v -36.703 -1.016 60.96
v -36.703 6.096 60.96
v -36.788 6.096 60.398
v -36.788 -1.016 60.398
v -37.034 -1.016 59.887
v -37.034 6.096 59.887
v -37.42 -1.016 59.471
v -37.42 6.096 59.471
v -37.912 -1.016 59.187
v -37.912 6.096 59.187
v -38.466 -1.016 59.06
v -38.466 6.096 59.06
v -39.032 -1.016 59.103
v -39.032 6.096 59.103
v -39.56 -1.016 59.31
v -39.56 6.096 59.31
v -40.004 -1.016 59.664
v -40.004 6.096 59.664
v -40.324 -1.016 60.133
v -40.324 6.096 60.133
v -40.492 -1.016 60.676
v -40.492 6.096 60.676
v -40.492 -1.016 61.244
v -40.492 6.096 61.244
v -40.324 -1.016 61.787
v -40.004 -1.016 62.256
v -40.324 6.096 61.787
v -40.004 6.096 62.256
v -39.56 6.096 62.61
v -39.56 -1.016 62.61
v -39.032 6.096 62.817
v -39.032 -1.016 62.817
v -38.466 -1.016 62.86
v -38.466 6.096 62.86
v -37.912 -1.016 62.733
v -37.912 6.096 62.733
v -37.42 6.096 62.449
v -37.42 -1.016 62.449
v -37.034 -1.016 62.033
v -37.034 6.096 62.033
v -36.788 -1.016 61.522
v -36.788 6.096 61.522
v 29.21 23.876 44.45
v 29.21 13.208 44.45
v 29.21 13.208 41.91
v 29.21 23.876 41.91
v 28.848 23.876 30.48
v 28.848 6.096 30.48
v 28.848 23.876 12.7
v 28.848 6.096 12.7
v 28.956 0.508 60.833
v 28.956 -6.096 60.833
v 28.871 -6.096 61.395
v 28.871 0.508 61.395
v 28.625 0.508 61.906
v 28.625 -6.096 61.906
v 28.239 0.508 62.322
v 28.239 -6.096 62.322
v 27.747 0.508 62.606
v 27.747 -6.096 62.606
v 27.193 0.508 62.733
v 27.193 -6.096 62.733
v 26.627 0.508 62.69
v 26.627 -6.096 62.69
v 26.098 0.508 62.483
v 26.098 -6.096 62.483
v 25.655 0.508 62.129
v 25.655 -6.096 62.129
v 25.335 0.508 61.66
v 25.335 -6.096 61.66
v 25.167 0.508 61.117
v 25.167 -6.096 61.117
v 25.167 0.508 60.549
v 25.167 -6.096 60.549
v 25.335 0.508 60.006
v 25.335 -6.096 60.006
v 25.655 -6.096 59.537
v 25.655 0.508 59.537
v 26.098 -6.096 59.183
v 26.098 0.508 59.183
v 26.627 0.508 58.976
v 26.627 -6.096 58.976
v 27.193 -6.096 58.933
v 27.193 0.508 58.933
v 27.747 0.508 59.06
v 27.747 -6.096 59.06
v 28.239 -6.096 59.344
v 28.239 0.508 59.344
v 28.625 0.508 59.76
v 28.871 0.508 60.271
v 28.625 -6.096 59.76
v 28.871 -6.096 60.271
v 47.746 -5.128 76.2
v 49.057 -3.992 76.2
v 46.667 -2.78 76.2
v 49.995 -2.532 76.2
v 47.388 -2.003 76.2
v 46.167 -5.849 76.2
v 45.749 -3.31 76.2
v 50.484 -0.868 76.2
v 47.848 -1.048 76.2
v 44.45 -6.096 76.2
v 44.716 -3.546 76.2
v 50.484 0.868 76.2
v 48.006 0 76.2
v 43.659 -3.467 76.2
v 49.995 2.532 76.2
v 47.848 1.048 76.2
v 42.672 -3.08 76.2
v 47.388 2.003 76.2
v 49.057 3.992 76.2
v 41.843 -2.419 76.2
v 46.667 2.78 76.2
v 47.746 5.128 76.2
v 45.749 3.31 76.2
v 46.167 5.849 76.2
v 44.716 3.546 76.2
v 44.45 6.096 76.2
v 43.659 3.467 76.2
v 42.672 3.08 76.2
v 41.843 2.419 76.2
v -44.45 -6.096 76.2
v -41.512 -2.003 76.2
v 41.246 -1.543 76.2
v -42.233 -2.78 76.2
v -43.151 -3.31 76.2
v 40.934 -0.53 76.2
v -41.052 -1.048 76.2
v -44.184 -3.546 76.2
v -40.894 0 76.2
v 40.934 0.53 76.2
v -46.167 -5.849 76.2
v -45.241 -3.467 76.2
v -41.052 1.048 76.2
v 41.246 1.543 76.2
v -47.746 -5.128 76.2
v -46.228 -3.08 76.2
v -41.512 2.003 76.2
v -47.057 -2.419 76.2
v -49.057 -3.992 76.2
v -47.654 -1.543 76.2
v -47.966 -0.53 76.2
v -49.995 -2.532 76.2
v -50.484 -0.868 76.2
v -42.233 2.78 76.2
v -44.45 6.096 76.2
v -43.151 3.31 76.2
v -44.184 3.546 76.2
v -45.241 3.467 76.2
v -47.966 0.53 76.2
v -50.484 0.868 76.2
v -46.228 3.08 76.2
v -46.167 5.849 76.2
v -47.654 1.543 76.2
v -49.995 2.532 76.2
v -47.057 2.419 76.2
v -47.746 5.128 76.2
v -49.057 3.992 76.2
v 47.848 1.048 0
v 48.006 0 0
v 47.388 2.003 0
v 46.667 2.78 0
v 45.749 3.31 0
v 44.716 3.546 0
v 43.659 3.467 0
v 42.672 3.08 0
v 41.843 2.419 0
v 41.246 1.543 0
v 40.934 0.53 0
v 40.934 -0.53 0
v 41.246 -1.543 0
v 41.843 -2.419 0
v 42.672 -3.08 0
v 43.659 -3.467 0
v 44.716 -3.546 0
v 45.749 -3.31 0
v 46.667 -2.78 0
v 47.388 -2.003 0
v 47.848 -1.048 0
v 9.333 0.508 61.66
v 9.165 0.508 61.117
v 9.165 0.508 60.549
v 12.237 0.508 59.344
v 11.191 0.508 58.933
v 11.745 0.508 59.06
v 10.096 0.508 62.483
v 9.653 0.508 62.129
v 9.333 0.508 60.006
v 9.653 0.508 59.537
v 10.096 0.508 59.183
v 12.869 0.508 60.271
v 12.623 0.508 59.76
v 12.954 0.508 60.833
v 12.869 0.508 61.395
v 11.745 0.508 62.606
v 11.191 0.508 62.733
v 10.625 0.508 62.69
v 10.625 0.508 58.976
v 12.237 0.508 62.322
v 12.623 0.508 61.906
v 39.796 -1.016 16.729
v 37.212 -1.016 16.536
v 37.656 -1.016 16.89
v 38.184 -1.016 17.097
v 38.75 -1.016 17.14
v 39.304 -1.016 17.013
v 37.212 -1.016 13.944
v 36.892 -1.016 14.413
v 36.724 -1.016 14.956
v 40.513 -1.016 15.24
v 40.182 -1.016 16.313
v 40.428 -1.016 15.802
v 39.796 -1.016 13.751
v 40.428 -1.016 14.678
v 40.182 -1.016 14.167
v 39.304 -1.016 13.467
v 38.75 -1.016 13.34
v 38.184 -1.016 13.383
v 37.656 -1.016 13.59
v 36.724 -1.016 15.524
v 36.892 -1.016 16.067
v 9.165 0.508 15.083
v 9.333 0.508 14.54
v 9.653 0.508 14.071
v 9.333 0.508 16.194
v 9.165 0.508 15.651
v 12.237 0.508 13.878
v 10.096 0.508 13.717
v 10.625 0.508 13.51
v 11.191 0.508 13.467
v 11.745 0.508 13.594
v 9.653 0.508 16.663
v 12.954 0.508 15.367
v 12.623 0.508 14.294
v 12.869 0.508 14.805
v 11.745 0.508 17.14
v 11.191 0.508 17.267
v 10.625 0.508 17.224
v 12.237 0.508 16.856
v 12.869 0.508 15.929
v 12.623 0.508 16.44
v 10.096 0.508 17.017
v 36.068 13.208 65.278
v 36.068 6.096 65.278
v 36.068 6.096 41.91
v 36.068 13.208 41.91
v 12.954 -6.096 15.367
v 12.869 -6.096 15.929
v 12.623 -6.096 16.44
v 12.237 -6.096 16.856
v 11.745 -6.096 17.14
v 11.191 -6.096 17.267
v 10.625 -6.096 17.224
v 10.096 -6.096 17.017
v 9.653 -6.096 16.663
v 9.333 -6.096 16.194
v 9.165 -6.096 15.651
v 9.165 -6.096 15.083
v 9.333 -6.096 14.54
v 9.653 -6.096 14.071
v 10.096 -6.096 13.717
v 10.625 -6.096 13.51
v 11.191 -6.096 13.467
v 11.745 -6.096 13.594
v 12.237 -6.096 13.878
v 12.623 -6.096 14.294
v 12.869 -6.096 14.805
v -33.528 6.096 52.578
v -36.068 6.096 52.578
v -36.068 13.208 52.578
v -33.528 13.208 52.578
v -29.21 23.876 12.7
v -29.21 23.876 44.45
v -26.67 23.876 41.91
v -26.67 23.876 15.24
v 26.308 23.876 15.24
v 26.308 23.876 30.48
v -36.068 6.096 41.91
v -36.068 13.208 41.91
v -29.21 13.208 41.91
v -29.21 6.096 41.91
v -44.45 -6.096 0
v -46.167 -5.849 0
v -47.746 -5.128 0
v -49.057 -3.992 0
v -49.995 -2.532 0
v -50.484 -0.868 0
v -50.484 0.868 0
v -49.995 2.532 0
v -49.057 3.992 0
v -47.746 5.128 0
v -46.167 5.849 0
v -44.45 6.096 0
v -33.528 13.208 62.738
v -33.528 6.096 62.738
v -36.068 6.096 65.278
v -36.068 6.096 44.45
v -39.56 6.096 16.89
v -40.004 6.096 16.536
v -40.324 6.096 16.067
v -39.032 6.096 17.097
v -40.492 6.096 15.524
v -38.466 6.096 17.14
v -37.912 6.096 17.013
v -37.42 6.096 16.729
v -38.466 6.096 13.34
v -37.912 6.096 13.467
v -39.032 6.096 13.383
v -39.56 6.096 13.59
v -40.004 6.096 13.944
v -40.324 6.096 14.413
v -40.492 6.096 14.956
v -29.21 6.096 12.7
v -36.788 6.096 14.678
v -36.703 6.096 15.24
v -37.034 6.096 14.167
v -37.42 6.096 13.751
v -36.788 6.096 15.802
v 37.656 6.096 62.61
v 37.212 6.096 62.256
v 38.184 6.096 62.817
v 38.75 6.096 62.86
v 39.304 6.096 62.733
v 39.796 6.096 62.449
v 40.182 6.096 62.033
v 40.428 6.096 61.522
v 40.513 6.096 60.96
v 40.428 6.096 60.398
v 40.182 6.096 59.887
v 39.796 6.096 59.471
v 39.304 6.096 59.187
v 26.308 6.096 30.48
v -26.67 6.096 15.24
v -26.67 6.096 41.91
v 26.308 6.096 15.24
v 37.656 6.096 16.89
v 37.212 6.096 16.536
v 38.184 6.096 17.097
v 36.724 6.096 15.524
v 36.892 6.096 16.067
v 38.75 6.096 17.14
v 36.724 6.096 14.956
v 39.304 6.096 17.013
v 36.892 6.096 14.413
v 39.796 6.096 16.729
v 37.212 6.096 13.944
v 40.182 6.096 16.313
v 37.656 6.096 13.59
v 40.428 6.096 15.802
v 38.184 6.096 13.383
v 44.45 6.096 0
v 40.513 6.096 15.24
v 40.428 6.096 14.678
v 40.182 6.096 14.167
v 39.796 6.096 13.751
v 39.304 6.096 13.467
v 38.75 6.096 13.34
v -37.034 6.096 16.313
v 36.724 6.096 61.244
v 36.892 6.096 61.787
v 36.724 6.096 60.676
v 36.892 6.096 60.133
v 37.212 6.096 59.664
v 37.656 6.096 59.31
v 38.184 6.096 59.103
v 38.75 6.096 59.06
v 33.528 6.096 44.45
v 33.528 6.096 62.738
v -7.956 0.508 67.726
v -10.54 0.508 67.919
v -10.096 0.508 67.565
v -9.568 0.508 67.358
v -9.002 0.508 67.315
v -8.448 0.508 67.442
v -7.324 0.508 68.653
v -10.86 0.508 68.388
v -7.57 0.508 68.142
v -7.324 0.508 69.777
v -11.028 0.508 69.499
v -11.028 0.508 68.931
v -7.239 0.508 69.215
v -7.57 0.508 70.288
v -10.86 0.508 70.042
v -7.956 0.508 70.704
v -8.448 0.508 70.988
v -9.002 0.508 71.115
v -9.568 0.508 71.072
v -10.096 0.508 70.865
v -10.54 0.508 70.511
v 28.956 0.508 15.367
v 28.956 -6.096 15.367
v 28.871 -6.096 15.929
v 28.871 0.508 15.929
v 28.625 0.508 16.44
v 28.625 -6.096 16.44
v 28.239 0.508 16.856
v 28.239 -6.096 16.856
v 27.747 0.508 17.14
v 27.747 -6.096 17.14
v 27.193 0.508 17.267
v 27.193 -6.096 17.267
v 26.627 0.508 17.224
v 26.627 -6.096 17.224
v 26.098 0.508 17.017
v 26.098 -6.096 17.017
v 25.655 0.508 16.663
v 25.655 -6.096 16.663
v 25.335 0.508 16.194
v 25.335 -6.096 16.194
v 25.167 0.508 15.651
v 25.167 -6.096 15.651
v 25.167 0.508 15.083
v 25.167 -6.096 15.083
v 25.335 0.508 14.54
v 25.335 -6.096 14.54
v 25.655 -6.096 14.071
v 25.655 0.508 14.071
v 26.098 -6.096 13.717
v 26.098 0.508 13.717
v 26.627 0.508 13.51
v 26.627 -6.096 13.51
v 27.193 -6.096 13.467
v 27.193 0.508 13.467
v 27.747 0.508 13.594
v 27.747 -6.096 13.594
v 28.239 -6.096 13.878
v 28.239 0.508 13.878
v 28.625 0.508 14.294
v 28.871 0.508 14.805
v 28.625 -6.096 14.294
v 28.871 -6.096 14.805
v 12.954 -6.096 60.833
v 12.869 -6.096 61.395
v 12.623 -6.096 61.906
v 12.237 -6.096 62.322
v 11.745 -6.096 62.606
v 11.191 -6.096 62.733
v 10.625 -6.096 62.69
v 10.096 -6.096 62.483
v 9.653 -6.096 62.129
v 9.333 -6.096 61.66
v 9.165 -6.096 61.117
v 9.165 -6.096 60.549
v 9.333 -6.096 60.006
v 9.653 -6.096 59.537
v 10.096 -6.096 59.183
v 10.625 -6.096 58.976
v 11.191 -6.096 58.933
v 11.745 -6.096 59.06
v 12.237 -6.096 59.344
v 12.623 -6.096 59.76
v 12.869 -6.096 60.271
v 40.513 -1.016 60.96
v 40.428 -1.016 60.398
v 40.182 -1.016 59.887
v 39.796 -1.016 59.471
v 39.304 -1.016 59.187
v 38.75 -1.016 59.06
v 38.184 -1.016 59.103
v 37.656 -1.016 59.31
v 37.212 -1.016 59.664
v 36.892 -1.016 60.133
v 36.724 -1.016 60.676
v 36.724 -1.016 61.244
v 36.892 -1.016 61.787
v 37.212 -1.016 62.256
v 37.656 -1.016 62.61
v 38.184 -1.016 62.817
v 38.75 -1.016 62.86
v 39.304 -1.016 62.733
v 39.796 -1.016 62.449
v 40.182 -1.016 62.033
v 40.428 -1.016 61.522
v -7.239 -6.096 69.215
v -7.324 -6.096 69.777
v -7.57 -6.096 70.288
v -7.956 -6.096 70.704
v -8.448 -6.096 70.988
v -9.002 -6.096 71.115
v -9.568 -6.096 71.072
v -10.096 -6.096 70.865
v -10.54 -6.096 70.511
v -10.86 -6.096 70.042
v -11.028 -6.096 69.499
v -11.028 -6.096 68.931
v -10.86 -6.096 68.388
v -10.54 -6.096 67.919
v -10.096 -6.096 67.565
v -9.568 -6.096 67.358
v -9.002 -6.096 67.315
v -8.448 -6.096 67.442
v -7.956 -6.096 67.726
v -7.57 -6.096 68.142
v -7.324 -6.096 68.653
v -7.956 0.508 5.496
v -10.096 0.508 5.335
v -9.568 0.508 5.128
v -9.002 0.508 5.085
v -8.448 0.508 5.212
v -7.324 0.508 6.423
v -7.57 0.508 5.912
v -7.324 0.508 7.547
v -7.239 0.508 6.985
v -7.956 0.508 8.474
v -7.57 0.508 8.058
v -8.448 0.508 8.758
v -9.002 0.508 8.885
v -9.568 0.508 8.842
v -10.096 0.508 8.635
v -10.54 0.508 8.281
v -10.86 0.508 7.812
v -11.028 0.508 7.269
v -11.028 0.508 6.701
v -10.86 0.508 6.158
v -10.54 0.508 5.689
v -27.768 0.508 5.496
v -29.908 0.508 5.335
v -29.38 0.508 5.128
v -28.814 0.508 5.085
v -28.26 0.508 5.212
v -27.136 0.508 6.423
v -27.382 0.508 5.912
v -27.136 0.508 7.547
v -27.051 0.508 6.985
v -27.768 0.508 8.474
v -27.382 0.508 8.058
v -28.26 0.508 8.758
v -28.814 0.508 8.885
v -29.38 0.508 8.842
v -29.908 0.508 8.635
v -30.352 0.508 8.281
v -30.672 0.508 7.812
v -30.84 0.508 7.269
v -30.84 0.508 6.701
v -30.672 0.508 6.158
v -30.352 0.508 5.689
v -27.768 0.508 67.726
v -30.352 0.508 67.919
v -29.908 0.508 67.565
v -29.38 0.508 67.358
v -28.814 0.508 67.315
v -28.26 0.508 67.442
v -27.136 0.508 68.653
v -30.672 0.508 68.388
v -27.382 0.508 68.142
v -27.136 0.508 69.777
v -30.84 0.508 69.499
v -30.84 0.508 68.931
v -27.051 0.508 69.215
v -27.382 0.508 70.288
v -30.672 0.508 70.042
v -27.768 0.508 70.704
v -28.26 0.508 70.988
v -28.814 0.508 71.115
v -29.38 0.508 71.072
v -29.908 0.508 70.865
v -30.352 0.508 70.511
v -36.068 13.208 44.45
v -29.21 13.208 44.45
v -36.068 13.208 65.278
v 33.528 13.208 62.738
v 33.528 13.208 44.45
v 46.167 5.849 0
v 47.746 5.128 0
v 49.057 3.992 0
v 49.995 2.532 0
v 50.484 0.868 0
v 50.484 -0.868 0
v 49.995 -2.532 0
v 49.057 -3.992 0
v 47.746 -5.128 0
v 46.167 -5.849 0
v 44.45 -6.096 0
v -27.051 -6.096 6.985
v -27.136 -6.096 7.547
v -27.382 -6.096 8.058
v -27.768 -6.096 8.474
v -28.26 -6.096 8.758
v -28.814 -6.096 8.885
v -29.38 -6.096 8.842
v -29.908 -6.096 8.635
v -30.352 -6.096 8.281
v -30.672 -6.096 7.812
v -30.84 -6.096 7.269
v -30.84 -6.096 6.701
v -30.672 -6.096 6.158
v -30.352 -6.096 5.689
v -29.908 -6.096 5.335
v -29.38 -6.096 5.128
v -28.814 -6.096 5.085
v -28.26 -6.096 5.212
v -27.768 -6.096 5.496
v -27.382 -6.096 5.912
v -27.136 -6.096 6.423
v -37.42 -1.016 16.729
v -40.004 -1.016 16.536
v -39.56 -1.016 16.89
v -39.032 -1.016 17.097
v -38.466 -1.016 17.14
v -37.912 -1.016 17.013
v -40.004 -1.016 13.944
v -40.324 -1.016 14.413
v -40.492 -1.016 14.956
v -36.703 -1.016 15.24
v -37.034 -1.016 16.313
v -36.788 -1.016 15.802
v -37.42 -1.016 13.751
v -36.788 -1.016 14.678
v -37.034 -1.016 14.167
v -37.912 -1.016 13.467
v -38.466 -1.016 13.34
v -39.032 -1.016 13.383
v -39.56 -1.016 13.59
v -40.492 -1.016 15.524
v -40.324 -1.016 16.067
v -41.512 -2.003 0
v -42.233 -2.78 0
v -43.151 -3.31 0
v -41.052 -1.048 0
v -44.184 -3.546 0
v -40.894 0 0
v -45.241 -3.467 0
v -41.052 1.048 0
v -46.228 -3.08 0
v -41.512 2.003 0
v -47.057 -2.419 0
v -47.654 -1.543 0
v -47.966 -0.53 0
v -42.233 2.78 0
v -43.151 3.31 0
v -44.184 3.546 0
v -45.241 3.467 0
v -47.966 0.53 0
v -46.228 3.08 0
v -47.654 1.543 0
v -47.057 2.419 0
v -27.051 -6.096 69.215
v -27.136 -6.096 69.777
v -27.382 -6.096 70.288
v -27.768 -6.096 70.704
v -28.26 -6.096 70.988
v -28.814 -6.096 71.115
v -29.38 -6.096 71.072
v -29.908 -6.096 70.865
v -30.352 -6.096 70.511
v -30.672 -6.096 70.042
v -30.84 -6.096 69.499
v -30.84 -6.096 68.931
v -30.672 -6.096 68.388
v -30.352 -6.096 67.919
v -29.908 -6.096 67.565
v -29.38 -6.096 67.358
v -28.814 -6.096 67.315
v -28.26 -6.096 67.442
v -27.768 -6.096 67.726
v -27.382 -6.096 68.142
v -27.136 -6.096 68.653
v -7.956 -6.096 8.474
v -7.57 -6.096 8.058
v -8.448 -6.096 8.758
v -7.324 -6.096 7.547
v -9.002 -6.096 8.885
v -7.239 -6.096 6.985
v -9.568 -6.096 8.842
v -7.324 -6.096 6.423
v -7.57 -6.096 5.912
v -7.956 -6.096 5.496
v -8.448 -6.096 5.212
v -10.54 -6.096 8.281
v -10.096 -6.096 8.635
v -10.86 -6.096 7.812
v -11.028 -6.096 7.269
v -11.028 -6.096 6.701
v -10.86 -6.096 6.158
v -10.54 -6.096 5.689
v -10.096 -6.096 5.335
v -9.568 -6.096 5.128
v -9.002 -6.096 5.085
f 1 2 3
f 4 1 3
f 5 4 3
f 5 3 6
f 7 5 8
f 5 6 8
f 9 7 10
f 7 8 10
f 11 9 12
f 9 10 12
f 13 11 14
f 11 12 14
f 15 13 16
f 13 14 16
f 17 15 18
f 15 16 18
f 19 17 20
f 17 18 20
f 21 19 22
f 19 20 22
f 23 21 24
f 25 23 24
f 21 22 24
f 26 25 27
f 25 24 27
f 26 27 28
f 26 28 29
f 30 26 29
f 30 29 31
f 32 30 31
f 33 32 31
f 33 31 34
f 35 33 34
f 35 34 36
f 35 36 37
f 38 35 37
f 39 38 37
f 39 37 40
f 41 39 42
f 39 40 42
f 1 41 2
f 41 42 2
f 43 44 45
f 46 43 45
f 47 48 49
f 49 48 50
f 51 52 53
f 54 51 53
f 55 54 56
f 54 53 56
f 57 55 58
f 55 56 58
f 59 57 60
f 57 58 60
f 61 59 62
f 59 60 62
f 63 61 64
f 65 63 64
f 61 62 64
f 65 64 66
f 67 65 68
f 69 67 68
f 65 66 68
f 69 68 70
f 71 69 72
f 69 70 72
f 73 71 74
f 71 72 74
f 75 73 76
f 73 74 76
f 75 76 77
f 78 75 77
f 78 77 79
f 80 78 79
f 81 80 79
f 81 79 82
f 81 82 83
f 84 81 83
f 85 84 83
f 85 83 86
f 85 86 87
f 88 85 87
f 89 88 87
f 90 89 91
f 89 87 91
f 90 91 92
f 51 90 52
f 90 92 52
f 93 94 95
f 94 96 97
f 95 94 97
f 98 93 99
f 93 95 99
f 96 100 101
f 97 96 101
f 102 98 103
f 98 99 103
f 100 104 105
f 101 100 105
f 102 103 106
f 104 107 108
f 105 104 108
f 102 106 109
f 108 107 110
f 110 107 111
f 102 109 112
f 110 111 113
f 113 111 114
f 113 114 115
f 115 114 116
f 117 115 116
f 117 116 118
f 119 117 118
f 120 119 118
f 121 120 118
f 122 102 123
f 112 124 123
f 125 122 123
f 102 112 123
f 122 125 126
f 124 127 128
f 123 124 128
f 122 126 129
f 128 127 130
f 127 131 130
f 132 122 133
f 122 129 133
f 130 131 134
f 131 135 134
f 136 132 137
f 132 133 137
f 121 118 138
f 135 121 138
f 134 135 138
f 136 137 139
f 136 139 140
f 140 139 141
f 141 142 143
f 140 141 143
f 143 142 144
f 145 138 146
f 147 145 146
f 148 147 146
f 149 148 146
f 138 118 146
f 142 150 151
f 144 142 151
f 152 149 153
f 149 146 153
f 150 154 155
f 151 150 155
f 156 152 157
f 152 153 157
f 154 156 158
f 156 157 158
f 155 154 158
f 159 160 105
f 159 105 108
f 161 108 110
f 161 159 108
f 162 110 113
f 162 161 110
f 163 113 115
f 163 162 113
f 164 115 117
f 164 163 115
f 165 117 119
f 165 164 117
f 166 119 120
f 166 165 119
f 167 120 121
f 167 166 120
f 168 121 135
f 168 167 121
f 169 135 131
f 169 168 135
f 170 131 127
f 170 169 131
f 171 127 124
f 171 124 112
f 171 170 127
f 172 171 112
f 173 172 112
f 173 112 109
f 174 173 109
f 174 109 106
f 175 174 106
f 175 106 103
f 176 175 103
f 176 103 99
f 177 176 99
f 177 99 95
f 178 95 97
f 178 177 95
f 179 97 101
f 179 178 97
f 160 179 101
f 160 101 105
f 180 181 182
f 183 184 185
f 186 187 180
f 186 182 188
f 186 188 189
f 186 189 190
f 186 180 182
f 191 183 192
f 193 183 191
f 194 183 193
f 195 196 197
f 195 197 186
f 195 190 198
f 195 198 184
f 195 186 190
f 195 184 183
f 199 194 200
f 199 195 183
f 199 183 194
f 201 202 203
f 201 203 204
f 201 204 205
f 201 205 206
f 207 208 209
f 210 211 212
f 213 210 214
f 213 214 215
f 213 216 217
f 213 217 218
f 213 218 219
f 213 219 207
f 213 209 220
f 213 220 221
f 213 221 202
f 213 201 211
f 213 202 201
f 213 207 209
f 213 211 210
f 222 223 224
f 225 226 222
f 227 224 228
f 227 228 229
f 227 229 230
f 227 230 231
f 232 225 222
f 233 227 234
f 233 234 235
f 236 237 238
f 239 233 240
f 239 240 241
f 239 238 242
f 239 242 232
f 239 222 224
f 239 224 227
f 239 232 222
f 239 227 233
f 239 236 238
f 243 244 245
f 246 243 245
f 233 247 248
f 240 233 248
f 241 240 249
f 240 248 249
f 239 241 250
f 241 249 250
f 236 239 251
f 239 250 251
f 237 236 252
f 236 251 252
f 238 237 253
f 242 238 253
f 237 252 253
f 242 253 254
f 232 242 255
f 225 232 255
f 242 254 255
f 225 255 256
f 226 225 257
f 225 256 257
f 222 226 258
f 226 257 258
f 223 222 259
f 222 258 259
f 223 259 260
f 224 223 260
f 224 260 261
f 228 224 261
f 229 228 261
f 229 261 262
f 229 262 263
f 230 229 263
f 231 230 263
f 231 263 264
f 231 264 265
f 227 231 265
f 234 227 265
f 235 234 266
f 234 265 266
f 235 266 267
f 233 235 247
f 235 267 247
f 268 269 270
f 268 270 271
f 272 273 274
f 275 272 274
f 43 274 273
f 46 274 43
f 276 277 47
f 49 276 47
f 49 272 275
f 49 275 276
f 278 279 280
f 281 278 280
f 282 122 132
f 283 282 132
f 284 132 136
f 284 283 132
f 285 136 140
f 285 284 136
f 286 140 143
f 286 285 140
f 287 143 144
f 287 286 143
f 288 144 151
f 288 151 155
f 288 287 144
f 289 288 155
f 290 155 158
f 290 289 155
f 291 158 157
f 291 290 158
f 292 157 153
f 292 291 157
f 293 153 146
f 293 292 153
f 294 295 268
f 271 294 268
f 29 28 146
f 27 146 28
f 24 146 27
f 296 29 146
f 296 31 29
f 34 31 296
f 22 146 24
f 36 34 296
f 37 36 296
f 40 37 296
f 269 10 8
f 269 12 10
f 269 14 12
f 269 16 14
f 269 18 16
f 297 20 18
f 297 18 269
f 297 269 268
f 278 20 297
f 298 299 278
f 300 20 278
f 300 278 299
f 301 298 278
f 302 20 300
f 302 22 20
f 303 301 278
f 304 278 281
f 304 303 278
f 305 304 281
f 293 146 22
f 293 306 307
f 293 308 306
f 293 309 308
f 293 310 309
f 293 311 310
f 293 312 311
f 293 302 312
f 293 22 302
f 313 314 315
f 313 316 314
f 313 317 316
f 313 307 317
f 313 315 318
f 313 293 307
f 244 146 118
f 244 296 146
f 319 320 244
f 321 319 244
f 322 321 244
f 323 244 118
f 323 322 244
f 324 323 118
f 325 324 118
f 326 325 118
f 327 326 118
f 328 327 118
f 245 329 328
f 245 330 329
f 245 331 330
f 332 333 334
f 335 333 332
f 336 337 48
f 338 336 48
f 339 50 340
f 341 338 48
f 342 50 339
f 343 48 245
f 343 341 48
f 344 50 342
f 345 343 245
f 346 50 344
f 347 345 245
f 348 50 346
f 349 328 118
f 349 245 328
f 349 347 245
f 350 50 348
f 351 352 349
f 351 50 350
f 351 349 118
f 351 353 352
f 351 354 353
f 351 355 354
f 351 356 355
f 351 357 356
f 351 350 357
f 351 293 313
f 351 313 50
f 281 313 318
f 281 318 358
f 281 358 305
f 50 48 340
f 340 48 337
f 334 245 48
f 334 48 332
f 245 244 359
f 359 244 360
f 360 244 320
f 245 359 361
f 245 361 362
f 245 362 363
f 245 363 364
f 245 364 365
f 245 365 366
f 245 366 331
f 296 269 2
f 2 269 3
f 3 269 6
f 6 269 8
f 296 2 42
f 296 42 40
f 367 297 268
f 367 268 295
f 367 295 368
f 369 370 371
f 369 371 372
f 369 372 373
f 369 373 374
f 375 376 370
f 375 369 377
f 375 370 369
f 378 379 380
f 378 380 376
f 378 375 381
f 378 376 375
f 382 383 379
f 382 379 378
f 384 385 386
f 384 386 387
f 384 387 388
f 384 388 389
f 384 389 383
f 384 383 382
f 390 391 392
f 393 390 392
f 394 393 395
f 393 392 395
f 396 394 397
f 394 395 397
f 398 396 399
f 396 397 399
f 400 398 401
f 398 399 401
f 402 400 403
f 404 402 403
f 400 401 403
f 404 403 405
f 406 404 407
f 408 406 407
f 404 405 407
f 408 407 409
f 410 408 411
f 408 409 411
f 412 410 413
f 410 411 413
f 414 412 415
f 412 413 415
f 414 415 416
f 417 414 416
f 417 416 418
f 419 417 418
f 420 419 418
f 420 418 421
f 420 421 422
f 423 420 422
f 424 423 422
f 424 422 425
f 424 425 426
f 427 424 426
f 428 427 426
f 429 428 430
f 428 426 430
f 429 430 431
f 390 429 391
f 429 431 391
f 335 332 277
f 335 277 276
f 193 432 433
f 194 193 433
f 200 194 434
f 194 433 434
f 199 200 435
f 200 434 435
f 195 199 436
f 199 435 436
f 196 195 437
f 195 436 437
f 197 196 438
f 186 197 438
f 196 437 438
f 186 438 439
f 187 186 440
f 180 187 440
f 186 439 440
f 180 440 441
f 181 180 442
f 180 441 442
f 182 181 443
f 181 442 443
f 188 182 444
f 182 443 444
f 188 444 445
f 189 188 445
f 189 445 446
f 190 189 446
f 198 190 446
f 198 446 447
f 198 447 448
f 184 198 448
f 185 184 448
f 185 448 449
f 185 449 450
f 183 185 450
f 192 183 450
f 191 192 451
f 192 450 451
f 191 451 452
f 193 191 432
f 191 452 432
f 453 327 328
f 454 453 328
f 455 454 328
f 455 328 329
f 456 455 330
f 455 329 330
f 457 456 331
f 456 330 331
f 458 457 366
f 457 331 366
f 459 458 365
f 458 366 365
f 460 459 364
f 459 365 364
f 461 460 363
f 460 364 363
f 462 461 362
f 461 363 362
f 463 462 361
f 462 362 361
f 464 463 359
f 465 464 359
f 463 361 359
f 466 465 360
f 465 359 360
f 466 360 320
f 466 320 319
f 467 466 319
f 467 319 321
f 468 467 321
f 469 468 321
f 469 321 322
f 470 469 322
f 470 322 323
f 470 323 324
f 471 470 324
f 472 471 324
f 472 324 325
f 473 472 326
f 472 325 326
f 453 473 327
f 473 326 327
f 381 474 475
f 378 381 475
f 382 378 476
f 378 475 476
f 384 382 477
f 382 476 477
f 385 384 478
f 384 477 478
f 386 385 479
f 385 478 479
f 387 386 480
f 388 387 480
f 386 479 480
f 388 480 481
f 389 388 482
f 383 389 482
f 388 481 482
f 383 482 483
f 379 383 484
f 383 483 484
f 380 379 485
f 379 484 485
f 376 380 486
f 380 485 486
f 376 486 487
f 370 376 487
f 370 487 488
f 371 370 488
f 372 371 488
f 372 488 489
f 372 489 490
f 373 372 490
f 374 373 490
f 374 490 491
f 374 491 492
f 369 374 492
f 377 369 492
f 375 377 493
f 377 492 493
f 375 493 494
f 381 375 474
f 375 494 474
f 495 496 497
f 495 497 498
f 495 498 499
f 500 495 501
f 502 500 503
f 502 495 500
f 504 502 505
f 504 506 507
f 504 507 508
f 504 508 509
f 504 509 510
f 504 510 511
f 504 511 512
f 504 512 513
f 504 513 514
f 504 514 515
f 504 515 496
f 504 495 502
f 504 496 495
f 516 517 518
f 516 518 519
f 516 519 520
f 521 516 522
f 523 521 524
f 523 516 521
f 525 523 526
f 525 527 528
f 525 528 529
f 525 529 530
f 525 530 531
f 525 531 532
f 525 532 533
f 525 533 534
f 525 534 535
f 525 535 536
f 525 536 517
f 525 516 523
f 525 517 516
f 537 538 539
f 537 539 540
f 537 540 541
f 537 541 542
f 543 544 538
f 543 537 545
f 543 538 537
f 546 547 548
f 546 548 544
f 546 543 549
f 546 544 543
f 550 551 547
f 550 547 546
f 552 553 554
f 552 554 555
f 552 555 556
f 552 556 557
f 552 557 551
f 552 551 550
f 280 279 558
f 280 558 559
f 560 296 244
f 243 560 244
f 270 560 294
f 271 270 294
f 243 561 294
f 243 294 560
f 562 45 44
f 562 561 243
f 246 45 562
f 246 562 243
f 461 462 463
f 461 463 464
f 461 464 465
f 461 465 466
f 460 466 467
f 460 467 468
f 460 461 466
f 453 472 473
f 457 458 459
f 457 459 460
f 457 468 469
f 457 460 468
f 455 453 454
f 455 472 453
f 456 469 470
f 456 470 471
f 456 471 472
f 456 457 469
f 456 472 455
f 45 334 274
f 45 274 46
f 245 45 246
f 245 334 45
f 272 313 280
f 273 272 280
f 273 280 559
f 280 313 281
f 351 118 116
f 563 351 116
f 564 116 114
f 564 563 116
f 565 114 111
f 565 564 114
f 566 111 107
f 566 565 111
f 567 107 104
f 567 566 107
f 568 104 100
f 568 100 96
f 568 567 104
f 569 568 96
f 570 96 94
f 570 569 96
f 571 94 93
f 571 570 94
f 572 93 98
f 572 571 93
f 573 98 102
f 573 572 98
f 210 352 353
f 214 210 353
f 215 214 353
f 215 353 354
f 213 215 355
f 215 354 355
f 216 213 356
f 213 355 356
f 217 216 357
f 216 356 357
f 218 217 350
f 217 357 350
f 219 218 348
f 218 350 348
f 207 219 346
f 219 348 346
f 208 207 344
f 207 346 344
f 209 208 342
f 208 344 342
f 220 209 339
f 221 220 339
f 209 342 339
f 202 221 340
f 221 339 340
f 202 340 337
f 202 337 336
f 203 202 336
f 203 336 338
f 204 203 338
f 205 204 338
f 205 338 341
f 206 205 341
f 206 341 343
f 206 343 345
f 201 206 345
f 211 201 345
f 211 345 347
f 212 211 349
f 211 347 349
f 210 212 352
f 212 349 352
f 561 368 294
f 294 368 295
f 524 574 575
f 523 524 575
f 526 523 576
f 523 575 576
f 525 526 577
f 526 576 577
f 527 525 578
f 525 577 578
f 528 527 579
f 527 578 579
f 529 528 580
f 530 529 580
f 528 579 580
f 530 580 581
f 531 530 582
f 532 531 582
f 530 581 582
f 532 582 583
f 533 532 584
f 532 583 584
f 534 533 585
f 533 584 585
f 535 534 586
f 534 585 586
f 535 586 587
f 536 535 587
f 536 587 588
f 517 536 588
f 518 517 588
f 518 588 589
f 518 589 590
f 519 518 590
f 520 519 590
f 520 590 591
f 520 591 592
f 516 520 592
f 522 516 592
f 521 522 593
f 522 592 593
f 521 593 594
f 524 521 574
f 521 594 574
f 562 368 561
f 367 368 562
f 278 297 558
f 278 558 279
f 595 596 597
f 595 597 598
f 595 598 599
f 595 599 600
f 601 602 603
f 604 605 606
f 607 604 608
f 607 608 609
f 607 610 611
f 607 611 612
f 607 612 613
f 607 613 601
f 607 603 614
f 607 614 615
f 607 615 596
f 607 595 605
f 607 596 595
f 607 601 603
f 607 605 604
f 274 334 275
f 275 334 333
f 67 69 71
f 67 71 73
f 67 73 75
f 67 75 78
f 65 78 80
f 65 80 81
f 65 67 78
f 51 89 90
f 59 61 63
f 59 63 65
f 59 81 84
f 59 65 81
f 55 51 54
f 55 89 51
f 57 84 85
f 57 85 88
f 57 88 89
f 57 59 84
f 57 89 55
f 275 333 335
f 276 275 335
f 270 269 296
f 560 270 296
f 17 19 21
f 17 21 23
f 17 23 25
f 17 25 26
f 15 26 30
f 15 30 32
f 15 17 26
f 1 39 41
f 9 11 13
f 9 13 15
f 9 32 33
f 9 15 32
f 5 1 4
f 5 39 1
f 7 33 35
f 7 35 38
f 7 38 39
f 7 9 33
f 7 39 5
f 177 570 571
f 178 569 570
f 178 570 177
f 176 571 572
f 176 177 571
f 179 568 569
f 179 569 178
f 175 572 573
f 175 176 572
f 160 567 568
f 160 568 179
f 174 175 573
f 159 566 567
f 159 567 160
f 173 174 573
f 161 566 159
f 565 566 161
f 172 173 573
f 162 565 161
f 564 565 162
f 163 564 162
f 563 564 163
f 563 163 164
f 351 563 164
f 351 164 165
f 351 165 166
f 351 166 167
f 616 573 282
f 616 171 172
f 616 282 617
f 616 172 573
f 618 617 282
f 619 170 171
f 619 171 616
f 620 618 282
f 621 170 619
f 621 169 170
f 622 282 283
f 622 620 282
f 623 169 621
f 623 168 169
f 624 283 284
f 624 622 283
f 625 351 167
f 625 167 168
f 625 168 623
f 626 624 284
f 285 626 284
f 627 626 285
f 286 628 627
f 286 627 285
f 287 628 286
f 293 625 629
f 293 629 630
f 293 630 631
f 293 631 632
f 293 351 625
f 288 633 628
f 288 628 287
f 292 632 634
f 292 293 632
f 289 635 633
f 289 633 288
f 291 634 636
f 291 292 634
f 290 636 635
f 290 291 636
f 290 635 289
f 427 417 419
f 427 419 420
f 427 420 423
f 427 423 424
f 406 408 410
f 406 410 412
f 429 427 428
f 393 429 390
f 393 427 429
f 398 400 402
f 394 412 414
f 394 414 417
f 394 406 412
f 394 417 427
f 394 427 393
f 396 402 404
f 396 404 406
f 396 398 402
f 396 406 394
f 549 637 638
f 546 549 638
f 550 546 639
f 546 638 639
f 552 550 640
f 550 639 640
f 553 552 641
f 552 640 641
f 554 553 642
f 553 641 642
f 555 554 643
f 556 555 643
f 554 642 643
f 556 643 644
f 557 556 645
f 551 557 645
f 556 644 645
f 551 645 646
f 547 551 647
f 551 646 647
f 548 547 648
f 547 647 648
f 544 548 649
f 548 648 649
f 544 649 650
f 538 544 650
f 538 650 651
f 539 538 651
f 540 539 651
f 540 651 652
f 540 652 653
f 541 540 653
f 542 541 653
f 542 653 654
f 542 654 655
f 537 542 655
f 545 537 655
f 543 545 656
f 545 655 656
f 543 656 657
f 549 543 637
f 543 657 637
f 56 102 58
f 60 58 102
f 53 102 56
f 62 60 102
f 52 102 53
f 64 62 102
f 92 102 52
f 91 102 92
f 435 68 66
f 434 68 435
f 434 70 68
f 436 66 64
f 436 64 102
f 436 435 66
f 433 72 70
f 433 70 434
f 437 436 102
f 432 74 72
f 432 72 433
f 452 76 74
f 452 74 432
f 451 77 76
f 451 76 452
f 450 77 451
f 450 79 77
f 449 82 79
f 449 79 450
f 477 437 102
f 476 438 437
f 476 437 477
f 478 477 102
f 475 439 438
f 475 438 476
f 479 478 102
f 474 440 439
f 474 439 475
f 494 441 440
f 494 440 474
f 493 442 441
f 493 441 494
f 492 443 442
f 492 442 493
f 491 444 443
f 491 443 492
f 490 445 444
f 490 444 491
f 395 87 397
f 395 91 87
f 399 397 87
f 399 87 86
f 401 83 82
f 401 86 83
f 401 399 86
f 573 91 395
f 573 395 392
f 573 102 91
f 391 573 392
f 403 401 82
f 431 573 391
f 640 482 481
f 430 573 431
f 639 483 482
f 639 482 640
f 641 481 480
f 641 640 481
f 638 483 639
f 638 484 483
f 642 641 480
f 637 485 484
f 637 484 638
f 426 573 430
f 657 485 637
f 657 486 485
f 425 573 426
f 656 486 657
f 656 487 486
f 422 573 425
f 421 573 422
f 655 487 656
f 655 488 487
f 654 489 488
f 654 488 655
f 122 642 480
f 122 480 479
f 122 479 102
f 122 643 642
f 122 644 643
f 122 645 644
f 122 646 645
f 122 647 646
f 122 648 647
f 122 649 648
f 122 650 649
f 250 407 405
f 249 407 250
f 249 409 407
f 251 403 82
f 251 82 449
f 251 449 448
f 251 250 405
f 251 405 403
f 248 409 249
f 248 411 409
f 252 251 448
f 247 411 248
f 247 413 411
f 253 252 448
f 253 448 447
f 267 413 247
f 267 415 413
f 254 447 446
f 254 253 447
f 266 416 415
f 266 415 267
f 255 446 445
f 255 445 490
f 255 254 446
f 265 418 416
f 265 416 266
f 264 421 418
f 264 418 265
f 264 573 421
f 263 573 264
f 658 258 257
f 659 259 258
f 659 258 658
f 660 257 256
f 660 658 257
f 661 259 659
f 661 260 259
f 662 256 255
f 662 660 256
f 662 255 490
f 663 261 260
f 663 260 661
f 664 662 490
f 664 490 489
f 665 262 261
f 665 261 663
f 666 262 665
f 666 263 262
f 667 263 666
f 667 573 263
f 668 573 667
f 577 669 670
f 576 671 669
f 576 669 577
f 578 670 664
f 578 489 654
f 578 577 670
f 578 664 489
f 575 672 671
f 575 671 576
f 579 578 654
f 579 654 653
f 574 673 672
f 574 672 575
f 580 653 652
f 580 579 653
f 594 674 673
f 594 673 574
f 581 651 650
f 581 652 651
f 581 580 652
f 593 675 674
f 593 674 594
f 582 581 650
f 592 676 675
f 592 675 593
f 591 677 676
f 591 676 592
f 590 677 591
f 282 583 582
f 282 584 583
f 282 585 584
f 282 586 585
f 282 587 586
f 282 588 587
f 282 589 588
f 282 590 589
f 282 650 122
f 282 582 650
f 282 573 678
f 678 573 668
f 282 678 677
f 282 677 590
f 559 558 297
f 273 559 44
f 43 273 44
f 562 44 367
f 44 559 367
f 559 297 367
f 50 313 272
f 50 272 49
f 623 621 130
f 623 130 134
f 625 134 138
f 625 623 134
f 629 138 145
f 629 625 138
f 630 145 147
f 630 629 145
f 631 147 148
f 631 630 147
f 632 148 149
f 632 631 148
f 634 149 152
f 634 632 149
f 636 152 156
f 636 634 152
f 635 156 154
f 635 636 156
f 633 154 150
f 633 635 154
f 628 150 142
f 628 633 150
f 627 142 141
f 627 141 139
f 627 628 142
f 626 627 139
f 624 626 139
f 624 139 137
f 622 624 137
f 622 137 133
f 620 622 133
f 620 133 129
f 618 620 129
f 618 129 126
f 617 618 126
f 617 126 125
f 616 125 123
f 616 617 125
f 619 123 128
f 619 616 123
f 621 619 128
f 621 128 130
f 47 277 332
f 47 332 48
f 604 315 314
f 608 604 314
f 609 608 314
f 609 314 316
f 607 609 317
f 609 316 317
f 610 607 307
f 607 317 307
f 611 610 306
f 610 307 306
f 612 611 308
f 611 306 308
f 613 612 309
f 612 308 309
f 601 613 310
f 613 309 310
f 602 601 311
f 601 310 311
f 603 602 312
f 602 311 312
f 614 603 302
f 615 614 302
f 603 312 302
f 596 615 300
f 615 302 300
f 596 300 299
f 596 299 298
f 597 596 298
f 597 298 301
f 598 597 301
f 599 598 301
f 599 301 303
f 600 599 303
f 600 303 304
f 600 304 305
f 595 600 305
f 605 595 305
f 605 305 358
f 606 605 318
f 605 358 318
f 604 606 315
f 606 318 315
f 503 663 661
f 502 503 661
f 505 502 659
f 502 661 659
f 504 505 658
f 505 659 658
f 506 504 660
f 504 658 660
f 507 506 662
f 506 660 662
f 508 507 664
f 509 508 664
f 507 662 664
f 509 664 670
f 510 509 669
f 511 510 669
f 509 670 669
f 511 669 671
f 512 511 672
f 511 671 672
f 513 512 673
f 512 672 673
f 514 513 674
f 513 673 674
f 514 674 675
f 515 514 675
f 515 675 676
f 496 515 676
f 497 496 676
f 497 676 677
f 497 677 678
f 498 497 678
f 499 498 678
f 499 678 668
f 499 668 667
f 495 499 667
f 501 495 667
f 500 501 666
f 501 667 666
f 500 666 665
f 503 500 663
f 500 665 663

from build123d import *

# Parameters (mm, degrees)
SKETCH1_R           = 3.556
BOSS_EXTRUDE1_DEPTH = 76.2
SKETCH2_R           = 1.905
CUT_EXTRUDE1_DEPTH  = 6.604
SKETCH3_W           = 58.057716114
SKETCH3_H           = 2.54
SKETCH3_W_2         = 2.54
SKETCH3_H_2         = 26.67
SKETCH3_W_3         = 58.42
SKETCH3_H_3         = 15.24
BOSS_EXTRUDE2_DEPTH = 17.78
SKETCH4_W           = 6.858
SKETCH4_H           = 2.54
SKETCH4_W_2         = 2.54
SKETCH4_H_2         = 10.16
SKETCH4_H_3         = 18.288
BOSS_EXTRUDE3_DEPTH = 7.112
SKETCH5_R           = 1.905
CUT_EXTRUDE2_DEPTH  = 7.112


with BuildPart() as part:
    # Sketch1 → Boss-Extrude1 (new body)
    with BuildSketch(Plane.XY):
        with BuildLine():
            Line((-44.45, 6.096), (44.45, 6.096))
            ThreePointArc((44.45, 6.096), (50.546, 0), (44.45, -6.096))
            Line((44.45, -6.096), (-44.45, -6.096))
            ThreePointArc((-44.45, -6.096), (-50.546, 0), (-44.45, 6.096))
        make_face()
        with Locations((-44.45, 0)):
            Circle(SKETCH1_R, mode=Mode.SUBTRACT)
        with Locations((44.45, 0)):
            Circle(SKETCH1_R, mode=Mode.SUBTRACT)
    extrude(amount=BOSS_EXTRUDE1_DEPTH)

    # Sketch2 → Cut-Extrude1 (cut)
    with BuildSketch(Plane.XZ.offset(6.096)):
        with Locations((-9.144, 69.215)):
            Circle(SKETCH2_R)
        with Locations((27.051, 60.833)):
            Circle(SKETCH2_R)
        with Locations((-28.956, 69.215)):
            Circle(SKETCH2_R)
        with Locations((-28.956, 6.985)):
            Circle(SKETCH2_R)
        with Locations((-9.144, 6.985)):
            Circle(SKETCH2_R)
        with Locations((11.049, 60.833)):
            Circle(SKETCH2_R)
        with Locations((11.049, 15.367)):
            Circle(SKETCH2_R)
        with Locations((27.051, 15.367)):
            Circle(SKETCH2_R)
    extrude(amount=-CUT_EXTRUDE1_DEPTH, mode=Mode.SUBTRACT)

    # Sketch3 → Boss-Extrude2 (add)
    with BuildSketch(Plane(origin=(0, 6.096, 0), x_dir=(1, 0, 0), z_dir=(0, 1, 0))):
        with Locations((-0.181141943, -13.97)):
            Rectangle(SKETCH3_W, SKETCH3_H)
        with Locations((-27.94, -28.575)):
            Rectangle(SKETCH3_W_2, SKETCH3_H_2)
        with Locations((0, -43.18)):
            Rectangle(SKETCH3_W_3, SKETCH3_H)
        with Locations((27.577716114, -22.86)):
            Rectangle(SKETCH3_W_2, SKETCH3_H_3)
    extrude(amount=BOSS_EXTRUDE2_DEPTH)

    # Sketch4 → Boss-Extrude3 (add)
    with BuildSketch(Plane(origin=(0, 6.096, 0), x_dir=(1, 0, 0), z_dir=(0, 1, 0))):
        with Locations((-32.639, -43.18)):
            Rectangle(SKETCH4_W, SKETCH4_H)
        with Locations((-34.798, -57.658)):
            Rectangle(SKETCH4_W_2, SKETCH4_H_2)
        Polygon((36.068, -62.738), (33.528, -62.738), (-33.528, -62.738), (-36.068, -62.738), (-36.068, -65.278), (36.068, -65.278), align=None)
        with Locations((34.798, -53.594)):
            Rectangle(SKETCH4_W_2, SKETCH4_H_3)
        with Locations((32.639, -43.18)):
            Rectangle(SKETCH4_W, SKETCH4_H)
    extrude(amount=BOSS_EXTRUDE3_DEPTH)

    # Sketch5 → Cut-Extrude2 (cut)
    with BuildSketch(Plane(origin=(0, 6.096, 0), x_dir=(1, 0, 0), z_dir=(0, 1, 0))):
        with Locations((38.608, -60.96)):
            Circle(SKETCH5_R)
        with Locations((-38.608, -60.96)):
            Circle(SKETCH5_R)
        with Locations((-38.608, -15.24)):
            Circle(SKETCH5_R)
        with Locations((38.608, -15.24)):
            Circle(SKETCH5_R)
    extrude(amount=-CUT_EXTRUDE2_DEPTH, mode=Mode.SUBTRACT)


solid = part.part
